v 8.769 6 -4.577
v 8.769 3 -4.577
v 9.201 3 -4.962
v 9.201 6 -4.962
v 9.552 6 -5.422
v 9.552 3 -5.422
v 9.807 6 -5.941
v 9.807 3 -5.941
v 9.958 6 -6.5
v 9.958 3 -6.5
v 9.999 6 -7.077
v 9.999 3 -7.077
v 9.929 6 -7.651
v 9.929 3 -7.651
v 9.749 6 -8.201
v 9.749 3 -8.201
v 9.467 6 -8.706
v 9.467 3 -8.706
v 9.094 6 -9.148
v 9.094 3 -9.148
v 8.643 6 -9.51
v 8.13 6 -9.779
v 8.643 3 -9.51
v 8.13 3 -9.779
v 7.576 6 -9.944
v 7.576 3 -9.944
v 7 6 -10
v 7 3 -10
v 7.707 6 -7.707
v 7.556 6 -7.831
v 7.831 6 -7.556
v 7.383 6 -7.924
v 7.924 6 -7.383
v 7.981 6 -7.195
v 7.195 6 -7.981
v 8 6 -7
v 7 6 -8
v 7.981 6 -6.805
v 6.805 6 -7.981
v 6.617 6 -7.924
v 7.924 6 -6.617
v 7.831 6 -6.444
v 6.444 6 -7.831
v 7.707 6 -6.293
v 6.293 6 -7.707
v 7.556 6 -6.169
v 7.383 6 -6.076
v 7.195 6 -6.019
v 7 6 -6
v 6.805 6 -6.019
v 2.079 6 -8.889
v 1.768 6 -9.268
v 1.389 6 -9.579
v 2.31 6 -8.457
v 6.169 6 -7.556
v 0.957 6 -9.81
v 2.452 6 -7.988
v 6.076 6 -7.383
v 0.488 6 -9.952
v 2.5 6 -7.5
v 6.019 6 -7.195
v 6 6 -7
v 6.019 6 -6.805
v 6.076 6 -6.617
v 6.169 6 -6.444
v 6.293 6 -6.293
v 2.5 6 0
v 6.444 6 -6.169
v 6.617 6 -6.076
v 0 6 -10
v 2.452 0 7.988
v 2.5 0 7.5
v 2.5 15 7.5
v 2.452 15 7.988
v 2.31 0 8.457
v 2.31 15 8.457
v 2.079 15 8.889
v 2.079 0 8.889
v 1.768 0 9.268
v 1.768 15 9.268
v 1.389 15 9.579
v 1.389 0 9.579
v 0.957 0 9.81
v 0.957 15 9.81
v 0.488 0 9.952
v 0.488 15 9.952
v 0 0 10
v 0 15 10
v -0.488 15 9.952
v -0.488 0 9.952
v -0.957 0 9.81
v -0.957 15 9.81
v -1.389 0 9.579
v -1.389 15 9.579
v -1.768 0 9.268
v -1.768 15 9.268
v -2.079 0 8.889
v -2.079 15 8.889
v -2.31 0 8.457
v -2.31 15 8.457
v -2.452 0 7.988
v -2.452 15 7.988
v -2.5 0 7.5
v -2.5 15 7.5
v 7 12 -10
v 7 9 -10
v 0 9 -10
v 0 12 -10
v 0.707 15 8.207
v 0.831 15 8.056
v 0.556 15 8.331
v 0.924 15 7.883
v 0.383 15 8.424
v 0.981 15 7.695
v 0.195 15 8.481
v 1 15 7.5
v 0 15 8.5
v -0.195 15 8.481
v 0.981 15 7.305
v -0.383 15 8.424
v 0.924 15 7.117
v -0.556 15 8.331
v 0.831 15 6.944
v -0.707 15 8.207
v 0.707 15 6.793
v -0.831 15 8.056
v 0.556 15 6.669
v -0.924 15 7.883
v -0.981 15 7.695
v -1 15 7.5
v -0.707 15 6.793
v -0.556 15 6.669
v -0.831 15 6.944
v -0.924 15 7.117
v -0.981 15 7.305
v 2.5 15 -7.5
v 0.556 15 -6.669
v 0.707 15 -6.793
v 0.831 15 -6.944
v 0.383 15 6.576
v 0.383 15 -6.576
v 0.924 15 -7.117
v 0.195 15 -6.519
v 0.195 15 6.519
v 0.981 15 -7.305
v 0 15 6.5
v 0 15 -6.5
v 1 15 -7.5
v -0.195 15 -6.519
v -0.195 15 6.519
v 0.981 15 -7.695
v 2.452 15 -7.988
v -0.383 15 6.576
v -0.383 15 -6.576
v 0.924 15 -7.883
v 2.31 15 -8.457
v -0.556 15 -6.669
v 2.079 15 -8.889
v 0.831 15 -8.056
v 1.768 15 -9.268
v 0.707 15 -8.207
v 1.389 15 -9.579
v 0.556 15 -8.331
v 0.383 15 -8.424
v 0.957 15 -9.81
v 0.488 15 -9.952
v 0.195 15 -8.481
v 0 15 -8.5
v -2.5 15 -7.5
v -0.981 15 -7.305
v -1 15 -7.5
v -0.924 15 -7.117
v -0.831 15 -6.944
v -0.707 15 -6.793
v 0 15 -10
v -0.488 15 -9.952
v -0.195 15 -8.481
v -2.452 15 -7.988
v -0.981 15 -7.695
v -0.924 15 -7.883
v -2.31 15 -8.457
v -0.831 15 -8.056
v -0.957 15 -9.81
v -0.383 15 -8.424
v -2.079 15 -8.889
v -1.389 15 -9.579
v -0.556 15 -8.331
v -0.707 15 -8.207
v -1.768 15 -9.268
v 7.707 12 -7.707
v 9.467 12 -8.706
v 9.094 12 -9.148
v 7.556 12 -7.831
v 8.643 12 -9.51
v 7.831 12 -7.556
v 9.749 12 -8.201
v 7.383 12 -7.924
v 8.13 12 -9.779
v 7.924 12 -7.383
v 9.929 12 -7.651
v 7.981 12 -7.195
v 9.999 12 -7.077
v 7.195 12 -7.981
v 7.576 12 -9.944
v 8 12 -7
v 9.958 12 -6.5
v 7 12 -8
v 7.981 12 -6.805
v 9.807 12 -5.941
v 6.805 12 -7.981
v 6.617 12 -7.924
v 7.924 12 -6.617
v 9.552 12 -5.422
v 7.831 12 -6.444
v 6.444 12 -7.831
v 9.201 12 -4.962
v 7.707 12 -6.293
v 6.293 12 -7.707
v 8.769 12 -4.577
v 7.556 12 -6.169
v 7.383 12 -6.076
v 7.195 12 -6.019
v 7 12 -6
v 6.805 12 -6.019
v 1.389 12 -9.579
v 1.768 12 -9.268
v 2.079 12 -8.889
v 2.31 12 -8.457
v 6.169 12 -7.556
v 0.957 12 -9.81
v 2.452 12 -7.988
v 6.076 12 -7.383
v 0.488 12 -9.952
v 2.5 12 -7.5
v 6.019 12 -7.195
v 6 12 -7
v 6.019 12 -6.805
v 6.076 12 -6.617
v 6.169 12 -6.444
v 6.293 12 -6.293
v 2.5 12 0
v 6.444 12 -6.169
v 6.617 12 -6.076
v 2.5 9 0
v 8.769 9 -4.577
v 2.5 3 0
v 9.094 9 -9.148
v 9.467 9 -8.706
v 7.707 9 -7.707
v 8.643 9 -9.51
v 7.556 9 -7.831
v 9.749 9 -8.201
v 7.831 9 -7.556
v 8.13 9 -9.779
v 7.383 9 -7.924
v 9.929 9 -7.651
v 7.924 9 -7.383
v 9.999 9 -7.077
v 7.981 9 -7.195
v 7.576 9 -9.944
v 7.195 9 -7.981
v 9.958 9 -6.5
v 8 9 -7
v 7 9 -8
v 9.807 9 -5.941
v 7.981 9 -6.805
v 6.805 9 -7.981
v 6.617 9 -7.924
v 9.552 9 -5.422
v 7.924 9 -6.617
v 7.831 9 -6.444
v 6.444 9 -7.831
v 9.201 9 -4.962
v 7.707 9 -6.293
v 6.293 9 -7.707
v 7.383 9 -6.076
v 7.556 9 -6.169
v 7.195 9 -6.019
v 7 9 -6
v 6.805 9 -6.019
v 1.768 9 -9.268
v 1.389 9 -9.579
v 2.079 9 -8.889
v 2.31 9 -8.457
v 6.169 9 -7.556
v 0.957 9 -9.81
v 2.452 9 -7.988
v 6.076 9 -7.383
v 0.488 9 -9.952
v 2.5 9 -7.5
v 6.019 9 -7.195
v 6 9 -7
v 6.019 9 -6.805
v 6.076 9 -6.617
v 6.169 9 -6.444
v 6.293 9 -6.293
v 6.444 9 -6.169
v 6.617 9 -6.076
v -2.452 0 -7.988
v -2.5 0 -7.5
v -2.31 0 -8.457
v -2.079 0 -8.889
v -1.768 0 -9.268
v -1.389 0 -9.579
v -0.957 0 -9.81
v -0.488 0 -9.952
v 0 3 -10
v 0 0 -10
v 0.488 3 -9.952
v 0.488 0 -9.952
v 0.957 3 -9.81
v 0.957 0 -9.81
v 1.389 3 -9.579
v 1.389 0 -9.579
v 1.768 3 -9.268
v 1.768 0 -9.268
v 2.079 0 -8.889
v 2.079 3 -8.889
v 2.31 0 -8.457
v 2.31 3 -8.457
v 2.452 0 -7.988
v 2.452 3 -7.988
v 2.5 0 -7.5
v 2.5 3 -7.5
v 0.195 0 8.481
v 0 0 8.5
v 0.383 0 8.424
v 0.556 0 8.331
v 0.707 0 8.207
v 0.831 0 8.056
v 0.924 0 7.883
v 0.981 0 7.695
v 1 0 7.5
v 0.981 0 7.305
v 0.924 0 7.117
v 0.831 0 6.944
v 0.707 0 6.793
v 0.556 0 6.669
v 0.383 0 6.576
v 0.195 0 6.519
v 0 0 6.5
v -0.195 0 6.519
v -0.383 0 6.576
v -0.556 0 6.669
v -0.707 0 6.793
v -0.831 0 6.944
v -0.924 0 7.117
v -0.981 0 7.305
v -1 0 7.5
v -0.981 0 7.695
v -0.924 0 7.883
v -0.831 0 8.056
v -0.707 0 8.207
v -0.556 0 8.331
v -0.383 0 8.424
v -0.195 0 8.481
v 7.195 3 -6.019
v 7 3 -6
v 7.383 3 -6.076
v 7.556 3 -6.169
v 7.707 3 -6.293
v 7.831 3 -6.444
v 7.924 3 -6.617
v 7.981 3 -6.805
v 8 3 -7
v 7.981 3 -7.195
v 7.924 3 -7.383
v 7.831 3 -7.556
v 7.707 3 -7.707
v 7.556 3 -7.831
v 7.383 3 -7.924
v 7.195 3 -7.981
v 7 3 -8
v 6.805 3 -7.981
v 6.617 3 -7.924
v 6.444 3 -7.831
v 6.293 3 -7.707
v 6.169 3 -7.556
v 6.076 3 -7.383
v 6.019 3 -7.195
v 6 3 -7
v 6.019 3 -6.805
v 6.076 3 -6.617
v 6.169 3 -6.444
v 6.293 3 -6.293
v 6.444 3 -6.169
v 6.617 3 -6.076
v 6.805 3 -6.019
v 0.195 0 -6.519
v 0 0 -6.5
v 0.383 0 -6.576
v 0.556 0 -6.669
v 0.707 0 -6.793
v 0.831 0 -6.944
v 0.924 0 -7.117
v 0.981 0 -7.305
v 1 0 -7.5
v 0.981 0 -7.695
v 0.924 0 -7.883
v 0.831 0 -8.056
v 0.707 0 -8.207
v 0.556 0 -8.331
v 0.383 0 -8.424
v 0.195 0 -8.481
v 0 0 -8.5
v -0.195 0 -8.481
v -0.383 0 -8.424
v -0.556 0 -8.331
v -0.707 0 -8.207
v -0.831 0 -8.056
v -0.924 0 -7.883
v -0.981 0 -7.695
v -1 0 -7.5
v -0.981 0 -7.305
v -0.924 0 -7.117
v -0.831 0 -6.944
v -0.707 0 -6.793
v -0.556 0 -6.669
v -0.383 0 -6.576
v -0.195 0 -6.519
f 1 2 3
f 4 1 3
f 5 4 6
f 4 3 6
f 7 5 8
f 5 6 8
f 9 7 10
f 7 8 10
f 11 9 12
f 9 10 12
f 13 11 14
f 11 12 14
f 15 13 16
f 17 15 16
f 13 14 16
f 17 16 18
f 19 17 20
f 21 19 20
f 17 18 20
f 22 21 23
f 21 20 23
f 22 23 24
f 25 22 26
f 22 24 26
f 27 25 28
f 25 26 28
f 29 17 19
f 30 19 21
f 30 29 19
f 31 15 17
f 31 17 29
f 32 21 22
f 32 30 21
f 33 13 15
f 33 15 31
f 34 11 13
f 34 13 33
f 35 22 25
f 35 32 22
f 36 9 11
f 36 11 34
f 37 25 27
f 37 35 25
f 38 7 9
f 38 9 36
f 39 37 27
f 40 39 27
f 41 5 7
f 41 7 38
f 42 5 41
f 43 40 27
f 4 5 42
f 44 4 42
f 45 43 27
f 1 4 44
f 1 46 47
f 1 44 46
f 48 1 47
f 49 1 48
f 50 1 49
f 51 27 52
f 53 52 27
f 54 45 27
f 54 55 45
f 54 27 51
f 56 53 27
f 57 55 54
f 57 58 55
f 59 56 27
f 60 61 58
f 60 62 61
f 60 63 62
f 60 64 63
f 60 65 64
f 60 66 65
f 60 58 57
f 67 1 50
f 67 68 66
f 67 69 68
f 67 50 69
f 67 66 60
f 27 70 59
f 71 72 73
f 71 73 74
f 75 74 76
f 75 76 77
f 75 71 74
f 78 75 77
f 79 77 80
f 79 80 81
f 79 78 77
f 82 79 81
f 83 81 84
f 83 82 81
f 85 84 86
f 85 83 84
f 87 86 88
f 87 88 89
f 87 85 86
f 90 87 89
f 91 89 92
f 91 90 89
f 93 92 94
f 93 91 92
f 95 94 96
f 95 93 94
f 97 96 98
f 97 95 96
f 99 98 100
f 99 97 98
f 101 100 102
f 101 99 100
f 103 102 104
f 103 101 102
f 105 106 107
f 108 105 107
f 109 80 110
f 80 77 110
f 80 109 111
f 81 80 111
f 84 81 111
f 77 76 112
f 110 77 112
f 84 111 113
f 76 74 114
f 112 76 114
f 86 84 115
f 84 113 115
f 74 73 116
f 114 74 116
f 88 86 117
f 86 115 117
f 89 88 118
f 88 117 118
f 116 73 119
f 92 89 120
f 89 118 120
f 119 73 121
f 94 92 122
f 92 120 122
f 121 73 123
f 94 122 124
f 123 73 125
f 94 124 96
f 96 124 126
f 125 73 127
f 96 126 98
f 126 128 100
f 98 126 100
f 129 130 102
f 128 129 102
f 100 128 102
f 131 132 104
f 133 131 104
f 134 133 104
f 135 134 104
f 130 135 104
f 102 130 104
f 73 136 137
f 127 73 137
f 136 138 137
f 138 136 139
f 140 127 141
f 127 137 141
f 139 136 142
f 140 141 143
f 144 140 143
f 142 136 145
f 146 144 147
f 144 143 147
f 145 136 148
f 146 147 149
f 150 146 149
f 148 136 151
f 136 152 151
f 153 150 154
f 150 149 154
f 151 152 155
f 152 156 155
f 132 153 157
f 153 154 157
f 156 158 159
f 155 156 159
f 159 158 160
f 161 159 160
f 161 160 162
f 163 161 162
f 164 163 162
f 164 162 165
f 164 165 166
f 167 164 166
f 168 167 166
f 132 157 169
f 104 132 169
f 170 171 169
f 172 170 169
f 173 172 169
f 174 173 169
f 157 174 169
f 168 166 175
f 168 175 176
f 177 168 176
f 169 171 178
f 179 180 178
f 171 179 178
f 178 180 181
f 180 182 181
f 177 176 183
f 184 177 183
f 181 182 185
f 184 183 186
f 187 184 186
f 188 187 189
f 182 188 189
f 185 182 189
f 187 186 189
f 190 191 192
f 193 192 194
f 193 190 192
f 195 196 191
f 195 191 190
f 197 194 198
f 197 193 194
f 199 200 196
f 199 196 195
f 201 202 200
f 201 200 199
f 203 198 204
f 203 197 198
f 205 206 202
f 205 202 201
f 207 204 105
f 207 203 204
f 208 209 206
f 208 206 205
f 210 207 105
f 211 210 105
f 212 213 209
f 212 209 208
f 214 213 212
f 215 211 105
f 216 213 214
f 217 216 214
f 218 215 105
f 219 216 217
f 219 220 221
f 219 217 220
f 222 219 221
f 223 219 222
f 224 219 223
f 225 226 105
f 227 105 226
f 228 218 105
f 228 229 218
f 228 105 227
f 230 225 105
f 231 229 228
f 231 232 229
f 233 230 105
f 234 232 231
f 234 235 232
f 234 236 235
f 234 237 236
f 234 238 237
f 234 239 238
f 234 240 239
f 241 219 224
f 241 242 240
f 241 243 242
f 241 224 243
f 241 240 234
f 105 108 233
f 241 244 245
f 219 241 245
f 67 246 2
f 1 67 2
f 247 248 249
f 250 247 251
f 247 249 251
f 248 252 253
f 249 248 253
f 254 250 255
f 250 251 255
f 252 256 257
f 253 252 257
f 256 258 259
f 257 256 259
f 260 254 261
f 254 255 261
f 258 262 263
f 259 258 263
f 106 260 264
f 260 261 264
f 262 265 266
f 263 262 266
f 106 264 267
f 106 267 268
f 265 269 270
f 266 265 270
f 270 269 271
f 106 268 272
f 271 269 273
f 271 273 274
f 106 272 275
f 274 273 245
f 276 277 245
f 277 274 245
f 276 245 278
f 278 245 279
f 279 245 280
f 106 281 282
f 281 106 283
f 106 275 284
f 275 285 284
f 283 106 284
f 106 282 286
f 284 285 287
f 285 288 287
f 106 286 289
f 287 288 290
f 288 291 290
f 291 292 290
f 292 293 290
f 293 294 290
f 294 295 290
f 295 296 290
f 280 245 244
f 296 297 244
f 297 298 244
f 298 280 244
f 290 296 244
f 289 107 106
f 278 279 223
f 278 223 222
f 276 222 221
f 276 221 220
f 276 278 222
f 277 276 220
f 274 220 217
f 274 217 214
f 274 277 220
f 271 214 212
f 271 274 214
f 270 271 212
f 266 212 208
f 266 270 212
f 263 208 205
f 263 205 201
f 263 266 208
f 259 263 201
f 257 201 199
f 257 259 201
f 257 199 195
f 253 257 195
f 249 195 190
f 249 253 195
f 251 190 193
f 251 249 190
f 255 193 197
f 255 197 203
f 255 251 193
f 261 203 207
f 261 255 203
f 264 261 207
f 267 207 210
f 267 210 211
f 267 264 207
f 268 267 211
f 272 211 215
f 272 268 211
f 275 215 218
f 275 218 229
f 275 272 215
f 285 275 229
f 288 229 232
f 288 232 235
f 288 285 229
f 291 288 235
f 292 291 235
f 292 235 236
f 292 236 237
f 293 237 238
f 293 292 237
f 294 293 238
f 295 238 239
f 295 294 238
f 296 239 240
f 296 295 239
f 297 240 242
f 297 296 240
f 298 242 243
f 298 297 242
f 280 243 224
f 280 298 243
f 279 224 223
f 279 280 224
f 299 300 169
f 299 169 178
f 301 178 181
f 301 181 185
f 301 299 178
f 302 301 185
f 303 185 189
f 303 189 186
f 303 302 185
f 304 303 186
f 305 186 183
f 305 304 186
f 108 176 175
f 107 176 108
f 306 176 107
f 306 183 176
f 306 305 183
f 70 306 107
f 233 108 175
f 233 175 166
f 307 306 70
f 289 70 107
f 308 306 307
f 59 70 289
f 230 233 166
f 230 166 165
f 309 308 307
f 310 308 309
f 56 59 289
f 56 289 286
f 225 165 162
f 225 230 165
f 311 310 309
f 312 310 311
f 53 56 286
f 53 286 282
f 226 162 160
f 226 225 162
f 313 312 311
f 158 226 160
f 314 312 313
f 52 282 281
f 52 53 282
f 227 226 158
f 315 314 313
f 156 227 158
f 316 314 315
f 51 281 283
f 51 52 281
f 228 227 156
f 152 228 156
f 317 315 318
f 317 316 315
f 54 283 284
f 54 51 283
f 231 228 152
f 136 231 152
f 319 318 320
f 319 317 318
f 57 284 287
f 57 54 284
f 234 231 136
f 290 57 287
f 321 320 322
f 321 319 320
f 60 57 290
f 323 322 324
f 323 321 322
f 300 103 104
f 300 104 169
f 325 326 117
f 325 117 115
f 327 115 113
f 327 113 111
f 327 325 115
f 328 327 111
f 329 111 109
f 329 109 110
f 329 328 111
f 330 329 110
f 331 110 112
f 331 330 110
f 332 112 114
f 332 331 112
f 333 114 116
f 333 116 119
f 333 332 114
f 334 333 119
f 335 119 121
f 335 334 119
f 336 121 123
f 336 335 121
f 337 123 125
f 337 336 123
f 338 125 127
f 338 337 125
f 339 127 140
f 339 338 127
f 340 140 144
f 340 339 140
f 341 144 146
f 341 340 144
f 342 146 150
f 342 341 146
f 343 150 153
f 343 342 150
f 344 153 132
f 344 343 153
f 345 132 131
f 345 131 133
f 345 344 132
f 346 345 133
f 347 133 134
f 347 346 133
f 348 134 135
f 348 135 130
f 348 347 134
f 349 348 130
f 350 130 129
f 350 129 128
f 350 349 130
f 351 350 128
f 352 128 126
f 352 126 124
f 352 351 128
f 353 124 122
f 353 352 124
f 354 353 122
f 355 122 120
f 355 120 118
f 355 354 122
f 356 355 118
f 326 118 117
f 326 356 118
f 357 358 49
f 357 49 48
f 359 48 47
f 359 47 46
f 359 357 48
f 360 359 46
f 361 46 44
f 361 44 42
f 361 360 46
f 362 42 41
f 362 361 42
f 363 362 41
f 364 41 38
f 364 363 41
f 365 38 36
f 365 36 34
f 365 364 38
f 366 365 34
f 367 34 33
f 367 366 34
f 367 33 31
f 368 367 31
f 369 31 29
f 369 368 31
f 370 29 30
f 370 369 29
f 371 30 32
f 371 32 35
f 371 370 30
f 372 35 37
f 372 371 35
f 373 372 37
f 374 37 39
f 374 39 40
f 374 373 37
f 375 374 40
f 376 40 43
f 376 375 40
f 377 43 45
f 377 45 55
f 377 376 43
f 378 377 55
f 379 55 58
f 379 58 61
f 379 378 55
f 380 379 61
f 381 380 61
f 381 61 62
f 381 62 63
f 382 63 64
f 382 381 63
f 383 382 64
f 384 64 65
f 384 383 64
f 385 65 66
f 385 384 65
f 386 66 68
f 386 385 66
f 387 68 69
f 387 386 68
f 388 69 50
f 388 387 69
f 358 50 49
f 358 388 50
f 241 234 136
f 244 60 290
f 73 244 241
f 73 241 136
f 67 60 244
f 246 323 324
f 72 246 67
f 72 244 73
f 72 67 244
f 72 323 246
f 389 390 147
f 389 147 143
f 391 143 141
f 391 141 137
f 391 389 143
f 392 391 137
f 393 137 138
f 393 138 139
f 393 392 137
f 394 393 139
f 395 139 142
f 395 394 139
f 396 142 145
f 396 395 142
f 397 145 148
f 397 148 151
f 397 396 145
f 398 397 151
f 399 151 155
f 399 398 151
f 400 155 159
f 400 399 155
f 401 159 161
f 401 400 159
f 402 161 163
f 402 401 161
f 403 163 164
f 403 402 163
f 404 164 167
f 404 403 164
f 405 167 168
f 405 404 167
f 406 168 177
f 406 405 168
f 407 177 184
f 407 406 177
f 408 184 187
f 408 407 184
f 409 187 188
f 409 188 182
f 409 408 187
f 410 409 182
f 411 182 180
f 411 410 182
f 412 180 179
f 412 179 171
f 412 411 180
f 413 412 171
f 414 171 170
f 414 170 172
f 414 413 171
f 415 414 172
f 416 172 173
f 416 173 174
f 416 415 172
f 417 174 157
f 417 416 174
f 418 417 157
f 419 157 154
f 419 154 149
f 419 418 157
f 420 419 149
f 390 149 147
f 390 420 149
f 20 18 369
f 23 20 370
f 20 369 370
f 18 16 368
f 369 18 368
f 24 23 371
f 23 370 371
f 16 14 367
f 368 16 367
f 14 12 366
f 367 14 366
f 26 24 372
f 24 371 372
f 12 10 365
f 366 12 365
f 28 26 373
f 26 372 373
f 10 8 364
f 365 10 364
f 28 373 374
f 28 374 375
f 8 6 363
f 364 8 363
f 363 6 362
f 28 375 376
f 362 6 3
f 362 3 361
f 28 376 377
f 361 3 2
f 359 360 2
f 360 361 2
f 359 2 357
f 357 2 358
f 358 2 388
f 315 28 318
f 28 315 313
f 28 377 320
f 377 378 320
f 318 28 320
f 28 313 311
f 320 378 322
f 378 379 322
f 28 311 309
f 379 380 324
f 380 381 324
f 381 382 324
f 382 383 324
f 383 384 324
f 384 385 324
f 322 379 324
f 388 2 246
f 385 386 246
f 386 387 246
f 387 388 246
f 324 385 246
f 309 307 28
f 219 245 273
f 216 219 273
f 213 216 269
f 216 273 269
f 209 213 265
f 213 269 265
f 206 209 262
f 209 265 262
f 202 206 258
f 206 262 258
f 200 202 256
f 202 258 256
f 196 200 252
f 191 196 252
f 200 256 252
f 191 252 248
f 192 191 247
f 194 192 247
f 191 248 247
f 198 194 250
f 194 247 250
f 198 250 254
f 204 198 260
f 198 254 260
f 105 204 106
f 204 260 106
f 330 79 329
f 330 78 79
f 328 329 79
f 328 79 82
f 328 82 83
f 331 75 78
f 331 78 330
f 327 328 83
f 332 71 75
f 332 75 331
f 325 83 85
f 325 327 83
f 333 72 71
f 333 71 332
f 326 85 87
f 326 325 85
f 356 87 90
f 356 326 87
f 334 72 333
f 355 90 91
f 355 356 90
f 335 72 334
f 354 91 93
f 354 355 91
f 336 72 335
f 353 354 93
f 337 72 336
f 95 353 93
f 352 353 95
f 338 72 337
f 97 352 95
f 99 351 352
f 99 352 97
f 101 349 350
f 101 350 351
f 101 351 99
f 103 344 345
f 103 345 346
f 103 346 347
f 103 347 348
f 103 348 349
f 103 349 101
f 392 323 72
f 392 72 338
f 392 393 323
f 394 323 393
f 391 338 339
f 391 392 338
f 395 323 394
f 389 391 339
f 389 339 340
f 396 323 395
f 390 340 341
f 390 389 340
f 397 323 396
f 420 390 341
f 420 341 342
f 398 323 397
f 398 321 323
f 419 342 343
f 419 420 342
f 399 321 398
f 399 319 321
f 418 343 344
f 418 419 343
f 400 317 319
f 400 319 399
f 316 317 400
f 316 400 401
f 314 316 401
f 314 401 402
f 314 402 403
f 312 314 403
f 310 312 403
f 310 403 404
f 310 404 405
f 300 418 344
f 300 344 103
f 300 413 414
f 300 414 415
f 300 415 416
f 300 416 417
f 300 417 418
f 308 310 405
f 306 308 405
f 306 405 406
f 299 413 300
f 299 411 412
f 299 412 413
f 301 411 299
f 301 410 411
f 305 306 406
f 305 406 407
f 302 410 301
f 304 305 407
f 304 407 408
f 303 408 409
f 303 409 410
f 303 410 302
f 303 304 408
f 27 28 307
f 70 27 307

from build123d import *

# Parameters (mm, degrees)
CROQUIS1_R              = 1
SALIENTE_EXTRUIR1_DEPTH = 15
SALIENTE_EXTRUIR2_START = -3
CROQUIS2_R              = 1
SALIENTE_EXTRUIR2_DEPTH = 3
CROQUIS3_R              = 1
SALIENTE_EXTRUIR3_DEPTH = 3


with BuildPart() as part:
    # Croquis1 → Saliente-Extruir1 (new body)
    with BuildSketch(Plane(origin=(0, 0, 0), x_dir=(1, 0, 0), z_dir=(0, 1, 0))):
        with BuildLine():
            Line((-2.5, -7.5), (-2.5, 7.5))
            ThreePointArc((-2.5, 7.5), (0, 10), (2.5, 7.5))
            Line((2.5, 7.5), (2.5, -7.5))
            ThreePointArc((2.5, -7.5), (0, -10), (-2.5, -7.5))
        make_face()
        with Locations(Location((0, 7.5, 0), (0, 0, 270))):
            Circle(CROQUIS1_R, mode=Mode.SUBTRACT)
        with Locations(Location((0, -7.5, 0), (0, 0, 270))):
            Circle(CROQUIS1_R, mode=Mode.SUBTRACT)
    extrude(amount=SALIENTE_EXTRUIR1_DEPTH)

    # Croquis2 → Saliente-Extruir2 (add)
    with BuildSketch(Plane(origin=(0, 6, 0), x_dir=(-1, 0, 0), z_dir=(0, 1, 0)).offset(SALIENTE_EXTRUIR2_START)):
        with BuildLine():
            Line((-2.5, -7.5), (-2.5, 0))
            Line((-2.5, 0), (-8.769008438, -4.577066004))
            ThreePointArc((-8.769008438, -4.577066004), (-9.852087129, -7.930375734), (-7, -10))
            Line((-7, -10), (0, -10))
            ThreePointArc((0, -10), (-1.767766953, -9.267766953), (-2.5, -7.5))
        make_face()
        with Locations(Location((-7, -7, 0), (0, 0, 90))):
            Circle(CROQUIS2_R, mode=Mode.SUBTRACT)
    extrude(amount=SALIENTE_EXTRUIR2_DEPTH)

    # Croquis3 → Saliente-Extruir3 (add)
    with BuildSketch(Plane(origin=(0, 9, 0), x_dir=(-1, 0, 0), z_dir=(0, 1, 0))):
        with BuildLine():
            Line((-7, -10), (0, -10))
            ThreePointArc((0, -10), (-1.767766953, -9.267766953), (-2.5, -7.5))
            Line((-2.5, -7.5), (-2.5, 0))
            Line((-2.5, 0), (-8.769008438, -4.577066004))
            ThreePointArc((-8.769008438, -4.577066004), (-9.852087129, -7.930375734), (-7, -10))
        make_face()
        with Locations(Location((-7, -7, 0), (0, 0, 90))):
            Circle(CROQUIS3_R, mode=Mode.SUBTRACT)
    extrude(amount=SALIENTE_EXTRUIR3_DEPTH)


solid = part.part
